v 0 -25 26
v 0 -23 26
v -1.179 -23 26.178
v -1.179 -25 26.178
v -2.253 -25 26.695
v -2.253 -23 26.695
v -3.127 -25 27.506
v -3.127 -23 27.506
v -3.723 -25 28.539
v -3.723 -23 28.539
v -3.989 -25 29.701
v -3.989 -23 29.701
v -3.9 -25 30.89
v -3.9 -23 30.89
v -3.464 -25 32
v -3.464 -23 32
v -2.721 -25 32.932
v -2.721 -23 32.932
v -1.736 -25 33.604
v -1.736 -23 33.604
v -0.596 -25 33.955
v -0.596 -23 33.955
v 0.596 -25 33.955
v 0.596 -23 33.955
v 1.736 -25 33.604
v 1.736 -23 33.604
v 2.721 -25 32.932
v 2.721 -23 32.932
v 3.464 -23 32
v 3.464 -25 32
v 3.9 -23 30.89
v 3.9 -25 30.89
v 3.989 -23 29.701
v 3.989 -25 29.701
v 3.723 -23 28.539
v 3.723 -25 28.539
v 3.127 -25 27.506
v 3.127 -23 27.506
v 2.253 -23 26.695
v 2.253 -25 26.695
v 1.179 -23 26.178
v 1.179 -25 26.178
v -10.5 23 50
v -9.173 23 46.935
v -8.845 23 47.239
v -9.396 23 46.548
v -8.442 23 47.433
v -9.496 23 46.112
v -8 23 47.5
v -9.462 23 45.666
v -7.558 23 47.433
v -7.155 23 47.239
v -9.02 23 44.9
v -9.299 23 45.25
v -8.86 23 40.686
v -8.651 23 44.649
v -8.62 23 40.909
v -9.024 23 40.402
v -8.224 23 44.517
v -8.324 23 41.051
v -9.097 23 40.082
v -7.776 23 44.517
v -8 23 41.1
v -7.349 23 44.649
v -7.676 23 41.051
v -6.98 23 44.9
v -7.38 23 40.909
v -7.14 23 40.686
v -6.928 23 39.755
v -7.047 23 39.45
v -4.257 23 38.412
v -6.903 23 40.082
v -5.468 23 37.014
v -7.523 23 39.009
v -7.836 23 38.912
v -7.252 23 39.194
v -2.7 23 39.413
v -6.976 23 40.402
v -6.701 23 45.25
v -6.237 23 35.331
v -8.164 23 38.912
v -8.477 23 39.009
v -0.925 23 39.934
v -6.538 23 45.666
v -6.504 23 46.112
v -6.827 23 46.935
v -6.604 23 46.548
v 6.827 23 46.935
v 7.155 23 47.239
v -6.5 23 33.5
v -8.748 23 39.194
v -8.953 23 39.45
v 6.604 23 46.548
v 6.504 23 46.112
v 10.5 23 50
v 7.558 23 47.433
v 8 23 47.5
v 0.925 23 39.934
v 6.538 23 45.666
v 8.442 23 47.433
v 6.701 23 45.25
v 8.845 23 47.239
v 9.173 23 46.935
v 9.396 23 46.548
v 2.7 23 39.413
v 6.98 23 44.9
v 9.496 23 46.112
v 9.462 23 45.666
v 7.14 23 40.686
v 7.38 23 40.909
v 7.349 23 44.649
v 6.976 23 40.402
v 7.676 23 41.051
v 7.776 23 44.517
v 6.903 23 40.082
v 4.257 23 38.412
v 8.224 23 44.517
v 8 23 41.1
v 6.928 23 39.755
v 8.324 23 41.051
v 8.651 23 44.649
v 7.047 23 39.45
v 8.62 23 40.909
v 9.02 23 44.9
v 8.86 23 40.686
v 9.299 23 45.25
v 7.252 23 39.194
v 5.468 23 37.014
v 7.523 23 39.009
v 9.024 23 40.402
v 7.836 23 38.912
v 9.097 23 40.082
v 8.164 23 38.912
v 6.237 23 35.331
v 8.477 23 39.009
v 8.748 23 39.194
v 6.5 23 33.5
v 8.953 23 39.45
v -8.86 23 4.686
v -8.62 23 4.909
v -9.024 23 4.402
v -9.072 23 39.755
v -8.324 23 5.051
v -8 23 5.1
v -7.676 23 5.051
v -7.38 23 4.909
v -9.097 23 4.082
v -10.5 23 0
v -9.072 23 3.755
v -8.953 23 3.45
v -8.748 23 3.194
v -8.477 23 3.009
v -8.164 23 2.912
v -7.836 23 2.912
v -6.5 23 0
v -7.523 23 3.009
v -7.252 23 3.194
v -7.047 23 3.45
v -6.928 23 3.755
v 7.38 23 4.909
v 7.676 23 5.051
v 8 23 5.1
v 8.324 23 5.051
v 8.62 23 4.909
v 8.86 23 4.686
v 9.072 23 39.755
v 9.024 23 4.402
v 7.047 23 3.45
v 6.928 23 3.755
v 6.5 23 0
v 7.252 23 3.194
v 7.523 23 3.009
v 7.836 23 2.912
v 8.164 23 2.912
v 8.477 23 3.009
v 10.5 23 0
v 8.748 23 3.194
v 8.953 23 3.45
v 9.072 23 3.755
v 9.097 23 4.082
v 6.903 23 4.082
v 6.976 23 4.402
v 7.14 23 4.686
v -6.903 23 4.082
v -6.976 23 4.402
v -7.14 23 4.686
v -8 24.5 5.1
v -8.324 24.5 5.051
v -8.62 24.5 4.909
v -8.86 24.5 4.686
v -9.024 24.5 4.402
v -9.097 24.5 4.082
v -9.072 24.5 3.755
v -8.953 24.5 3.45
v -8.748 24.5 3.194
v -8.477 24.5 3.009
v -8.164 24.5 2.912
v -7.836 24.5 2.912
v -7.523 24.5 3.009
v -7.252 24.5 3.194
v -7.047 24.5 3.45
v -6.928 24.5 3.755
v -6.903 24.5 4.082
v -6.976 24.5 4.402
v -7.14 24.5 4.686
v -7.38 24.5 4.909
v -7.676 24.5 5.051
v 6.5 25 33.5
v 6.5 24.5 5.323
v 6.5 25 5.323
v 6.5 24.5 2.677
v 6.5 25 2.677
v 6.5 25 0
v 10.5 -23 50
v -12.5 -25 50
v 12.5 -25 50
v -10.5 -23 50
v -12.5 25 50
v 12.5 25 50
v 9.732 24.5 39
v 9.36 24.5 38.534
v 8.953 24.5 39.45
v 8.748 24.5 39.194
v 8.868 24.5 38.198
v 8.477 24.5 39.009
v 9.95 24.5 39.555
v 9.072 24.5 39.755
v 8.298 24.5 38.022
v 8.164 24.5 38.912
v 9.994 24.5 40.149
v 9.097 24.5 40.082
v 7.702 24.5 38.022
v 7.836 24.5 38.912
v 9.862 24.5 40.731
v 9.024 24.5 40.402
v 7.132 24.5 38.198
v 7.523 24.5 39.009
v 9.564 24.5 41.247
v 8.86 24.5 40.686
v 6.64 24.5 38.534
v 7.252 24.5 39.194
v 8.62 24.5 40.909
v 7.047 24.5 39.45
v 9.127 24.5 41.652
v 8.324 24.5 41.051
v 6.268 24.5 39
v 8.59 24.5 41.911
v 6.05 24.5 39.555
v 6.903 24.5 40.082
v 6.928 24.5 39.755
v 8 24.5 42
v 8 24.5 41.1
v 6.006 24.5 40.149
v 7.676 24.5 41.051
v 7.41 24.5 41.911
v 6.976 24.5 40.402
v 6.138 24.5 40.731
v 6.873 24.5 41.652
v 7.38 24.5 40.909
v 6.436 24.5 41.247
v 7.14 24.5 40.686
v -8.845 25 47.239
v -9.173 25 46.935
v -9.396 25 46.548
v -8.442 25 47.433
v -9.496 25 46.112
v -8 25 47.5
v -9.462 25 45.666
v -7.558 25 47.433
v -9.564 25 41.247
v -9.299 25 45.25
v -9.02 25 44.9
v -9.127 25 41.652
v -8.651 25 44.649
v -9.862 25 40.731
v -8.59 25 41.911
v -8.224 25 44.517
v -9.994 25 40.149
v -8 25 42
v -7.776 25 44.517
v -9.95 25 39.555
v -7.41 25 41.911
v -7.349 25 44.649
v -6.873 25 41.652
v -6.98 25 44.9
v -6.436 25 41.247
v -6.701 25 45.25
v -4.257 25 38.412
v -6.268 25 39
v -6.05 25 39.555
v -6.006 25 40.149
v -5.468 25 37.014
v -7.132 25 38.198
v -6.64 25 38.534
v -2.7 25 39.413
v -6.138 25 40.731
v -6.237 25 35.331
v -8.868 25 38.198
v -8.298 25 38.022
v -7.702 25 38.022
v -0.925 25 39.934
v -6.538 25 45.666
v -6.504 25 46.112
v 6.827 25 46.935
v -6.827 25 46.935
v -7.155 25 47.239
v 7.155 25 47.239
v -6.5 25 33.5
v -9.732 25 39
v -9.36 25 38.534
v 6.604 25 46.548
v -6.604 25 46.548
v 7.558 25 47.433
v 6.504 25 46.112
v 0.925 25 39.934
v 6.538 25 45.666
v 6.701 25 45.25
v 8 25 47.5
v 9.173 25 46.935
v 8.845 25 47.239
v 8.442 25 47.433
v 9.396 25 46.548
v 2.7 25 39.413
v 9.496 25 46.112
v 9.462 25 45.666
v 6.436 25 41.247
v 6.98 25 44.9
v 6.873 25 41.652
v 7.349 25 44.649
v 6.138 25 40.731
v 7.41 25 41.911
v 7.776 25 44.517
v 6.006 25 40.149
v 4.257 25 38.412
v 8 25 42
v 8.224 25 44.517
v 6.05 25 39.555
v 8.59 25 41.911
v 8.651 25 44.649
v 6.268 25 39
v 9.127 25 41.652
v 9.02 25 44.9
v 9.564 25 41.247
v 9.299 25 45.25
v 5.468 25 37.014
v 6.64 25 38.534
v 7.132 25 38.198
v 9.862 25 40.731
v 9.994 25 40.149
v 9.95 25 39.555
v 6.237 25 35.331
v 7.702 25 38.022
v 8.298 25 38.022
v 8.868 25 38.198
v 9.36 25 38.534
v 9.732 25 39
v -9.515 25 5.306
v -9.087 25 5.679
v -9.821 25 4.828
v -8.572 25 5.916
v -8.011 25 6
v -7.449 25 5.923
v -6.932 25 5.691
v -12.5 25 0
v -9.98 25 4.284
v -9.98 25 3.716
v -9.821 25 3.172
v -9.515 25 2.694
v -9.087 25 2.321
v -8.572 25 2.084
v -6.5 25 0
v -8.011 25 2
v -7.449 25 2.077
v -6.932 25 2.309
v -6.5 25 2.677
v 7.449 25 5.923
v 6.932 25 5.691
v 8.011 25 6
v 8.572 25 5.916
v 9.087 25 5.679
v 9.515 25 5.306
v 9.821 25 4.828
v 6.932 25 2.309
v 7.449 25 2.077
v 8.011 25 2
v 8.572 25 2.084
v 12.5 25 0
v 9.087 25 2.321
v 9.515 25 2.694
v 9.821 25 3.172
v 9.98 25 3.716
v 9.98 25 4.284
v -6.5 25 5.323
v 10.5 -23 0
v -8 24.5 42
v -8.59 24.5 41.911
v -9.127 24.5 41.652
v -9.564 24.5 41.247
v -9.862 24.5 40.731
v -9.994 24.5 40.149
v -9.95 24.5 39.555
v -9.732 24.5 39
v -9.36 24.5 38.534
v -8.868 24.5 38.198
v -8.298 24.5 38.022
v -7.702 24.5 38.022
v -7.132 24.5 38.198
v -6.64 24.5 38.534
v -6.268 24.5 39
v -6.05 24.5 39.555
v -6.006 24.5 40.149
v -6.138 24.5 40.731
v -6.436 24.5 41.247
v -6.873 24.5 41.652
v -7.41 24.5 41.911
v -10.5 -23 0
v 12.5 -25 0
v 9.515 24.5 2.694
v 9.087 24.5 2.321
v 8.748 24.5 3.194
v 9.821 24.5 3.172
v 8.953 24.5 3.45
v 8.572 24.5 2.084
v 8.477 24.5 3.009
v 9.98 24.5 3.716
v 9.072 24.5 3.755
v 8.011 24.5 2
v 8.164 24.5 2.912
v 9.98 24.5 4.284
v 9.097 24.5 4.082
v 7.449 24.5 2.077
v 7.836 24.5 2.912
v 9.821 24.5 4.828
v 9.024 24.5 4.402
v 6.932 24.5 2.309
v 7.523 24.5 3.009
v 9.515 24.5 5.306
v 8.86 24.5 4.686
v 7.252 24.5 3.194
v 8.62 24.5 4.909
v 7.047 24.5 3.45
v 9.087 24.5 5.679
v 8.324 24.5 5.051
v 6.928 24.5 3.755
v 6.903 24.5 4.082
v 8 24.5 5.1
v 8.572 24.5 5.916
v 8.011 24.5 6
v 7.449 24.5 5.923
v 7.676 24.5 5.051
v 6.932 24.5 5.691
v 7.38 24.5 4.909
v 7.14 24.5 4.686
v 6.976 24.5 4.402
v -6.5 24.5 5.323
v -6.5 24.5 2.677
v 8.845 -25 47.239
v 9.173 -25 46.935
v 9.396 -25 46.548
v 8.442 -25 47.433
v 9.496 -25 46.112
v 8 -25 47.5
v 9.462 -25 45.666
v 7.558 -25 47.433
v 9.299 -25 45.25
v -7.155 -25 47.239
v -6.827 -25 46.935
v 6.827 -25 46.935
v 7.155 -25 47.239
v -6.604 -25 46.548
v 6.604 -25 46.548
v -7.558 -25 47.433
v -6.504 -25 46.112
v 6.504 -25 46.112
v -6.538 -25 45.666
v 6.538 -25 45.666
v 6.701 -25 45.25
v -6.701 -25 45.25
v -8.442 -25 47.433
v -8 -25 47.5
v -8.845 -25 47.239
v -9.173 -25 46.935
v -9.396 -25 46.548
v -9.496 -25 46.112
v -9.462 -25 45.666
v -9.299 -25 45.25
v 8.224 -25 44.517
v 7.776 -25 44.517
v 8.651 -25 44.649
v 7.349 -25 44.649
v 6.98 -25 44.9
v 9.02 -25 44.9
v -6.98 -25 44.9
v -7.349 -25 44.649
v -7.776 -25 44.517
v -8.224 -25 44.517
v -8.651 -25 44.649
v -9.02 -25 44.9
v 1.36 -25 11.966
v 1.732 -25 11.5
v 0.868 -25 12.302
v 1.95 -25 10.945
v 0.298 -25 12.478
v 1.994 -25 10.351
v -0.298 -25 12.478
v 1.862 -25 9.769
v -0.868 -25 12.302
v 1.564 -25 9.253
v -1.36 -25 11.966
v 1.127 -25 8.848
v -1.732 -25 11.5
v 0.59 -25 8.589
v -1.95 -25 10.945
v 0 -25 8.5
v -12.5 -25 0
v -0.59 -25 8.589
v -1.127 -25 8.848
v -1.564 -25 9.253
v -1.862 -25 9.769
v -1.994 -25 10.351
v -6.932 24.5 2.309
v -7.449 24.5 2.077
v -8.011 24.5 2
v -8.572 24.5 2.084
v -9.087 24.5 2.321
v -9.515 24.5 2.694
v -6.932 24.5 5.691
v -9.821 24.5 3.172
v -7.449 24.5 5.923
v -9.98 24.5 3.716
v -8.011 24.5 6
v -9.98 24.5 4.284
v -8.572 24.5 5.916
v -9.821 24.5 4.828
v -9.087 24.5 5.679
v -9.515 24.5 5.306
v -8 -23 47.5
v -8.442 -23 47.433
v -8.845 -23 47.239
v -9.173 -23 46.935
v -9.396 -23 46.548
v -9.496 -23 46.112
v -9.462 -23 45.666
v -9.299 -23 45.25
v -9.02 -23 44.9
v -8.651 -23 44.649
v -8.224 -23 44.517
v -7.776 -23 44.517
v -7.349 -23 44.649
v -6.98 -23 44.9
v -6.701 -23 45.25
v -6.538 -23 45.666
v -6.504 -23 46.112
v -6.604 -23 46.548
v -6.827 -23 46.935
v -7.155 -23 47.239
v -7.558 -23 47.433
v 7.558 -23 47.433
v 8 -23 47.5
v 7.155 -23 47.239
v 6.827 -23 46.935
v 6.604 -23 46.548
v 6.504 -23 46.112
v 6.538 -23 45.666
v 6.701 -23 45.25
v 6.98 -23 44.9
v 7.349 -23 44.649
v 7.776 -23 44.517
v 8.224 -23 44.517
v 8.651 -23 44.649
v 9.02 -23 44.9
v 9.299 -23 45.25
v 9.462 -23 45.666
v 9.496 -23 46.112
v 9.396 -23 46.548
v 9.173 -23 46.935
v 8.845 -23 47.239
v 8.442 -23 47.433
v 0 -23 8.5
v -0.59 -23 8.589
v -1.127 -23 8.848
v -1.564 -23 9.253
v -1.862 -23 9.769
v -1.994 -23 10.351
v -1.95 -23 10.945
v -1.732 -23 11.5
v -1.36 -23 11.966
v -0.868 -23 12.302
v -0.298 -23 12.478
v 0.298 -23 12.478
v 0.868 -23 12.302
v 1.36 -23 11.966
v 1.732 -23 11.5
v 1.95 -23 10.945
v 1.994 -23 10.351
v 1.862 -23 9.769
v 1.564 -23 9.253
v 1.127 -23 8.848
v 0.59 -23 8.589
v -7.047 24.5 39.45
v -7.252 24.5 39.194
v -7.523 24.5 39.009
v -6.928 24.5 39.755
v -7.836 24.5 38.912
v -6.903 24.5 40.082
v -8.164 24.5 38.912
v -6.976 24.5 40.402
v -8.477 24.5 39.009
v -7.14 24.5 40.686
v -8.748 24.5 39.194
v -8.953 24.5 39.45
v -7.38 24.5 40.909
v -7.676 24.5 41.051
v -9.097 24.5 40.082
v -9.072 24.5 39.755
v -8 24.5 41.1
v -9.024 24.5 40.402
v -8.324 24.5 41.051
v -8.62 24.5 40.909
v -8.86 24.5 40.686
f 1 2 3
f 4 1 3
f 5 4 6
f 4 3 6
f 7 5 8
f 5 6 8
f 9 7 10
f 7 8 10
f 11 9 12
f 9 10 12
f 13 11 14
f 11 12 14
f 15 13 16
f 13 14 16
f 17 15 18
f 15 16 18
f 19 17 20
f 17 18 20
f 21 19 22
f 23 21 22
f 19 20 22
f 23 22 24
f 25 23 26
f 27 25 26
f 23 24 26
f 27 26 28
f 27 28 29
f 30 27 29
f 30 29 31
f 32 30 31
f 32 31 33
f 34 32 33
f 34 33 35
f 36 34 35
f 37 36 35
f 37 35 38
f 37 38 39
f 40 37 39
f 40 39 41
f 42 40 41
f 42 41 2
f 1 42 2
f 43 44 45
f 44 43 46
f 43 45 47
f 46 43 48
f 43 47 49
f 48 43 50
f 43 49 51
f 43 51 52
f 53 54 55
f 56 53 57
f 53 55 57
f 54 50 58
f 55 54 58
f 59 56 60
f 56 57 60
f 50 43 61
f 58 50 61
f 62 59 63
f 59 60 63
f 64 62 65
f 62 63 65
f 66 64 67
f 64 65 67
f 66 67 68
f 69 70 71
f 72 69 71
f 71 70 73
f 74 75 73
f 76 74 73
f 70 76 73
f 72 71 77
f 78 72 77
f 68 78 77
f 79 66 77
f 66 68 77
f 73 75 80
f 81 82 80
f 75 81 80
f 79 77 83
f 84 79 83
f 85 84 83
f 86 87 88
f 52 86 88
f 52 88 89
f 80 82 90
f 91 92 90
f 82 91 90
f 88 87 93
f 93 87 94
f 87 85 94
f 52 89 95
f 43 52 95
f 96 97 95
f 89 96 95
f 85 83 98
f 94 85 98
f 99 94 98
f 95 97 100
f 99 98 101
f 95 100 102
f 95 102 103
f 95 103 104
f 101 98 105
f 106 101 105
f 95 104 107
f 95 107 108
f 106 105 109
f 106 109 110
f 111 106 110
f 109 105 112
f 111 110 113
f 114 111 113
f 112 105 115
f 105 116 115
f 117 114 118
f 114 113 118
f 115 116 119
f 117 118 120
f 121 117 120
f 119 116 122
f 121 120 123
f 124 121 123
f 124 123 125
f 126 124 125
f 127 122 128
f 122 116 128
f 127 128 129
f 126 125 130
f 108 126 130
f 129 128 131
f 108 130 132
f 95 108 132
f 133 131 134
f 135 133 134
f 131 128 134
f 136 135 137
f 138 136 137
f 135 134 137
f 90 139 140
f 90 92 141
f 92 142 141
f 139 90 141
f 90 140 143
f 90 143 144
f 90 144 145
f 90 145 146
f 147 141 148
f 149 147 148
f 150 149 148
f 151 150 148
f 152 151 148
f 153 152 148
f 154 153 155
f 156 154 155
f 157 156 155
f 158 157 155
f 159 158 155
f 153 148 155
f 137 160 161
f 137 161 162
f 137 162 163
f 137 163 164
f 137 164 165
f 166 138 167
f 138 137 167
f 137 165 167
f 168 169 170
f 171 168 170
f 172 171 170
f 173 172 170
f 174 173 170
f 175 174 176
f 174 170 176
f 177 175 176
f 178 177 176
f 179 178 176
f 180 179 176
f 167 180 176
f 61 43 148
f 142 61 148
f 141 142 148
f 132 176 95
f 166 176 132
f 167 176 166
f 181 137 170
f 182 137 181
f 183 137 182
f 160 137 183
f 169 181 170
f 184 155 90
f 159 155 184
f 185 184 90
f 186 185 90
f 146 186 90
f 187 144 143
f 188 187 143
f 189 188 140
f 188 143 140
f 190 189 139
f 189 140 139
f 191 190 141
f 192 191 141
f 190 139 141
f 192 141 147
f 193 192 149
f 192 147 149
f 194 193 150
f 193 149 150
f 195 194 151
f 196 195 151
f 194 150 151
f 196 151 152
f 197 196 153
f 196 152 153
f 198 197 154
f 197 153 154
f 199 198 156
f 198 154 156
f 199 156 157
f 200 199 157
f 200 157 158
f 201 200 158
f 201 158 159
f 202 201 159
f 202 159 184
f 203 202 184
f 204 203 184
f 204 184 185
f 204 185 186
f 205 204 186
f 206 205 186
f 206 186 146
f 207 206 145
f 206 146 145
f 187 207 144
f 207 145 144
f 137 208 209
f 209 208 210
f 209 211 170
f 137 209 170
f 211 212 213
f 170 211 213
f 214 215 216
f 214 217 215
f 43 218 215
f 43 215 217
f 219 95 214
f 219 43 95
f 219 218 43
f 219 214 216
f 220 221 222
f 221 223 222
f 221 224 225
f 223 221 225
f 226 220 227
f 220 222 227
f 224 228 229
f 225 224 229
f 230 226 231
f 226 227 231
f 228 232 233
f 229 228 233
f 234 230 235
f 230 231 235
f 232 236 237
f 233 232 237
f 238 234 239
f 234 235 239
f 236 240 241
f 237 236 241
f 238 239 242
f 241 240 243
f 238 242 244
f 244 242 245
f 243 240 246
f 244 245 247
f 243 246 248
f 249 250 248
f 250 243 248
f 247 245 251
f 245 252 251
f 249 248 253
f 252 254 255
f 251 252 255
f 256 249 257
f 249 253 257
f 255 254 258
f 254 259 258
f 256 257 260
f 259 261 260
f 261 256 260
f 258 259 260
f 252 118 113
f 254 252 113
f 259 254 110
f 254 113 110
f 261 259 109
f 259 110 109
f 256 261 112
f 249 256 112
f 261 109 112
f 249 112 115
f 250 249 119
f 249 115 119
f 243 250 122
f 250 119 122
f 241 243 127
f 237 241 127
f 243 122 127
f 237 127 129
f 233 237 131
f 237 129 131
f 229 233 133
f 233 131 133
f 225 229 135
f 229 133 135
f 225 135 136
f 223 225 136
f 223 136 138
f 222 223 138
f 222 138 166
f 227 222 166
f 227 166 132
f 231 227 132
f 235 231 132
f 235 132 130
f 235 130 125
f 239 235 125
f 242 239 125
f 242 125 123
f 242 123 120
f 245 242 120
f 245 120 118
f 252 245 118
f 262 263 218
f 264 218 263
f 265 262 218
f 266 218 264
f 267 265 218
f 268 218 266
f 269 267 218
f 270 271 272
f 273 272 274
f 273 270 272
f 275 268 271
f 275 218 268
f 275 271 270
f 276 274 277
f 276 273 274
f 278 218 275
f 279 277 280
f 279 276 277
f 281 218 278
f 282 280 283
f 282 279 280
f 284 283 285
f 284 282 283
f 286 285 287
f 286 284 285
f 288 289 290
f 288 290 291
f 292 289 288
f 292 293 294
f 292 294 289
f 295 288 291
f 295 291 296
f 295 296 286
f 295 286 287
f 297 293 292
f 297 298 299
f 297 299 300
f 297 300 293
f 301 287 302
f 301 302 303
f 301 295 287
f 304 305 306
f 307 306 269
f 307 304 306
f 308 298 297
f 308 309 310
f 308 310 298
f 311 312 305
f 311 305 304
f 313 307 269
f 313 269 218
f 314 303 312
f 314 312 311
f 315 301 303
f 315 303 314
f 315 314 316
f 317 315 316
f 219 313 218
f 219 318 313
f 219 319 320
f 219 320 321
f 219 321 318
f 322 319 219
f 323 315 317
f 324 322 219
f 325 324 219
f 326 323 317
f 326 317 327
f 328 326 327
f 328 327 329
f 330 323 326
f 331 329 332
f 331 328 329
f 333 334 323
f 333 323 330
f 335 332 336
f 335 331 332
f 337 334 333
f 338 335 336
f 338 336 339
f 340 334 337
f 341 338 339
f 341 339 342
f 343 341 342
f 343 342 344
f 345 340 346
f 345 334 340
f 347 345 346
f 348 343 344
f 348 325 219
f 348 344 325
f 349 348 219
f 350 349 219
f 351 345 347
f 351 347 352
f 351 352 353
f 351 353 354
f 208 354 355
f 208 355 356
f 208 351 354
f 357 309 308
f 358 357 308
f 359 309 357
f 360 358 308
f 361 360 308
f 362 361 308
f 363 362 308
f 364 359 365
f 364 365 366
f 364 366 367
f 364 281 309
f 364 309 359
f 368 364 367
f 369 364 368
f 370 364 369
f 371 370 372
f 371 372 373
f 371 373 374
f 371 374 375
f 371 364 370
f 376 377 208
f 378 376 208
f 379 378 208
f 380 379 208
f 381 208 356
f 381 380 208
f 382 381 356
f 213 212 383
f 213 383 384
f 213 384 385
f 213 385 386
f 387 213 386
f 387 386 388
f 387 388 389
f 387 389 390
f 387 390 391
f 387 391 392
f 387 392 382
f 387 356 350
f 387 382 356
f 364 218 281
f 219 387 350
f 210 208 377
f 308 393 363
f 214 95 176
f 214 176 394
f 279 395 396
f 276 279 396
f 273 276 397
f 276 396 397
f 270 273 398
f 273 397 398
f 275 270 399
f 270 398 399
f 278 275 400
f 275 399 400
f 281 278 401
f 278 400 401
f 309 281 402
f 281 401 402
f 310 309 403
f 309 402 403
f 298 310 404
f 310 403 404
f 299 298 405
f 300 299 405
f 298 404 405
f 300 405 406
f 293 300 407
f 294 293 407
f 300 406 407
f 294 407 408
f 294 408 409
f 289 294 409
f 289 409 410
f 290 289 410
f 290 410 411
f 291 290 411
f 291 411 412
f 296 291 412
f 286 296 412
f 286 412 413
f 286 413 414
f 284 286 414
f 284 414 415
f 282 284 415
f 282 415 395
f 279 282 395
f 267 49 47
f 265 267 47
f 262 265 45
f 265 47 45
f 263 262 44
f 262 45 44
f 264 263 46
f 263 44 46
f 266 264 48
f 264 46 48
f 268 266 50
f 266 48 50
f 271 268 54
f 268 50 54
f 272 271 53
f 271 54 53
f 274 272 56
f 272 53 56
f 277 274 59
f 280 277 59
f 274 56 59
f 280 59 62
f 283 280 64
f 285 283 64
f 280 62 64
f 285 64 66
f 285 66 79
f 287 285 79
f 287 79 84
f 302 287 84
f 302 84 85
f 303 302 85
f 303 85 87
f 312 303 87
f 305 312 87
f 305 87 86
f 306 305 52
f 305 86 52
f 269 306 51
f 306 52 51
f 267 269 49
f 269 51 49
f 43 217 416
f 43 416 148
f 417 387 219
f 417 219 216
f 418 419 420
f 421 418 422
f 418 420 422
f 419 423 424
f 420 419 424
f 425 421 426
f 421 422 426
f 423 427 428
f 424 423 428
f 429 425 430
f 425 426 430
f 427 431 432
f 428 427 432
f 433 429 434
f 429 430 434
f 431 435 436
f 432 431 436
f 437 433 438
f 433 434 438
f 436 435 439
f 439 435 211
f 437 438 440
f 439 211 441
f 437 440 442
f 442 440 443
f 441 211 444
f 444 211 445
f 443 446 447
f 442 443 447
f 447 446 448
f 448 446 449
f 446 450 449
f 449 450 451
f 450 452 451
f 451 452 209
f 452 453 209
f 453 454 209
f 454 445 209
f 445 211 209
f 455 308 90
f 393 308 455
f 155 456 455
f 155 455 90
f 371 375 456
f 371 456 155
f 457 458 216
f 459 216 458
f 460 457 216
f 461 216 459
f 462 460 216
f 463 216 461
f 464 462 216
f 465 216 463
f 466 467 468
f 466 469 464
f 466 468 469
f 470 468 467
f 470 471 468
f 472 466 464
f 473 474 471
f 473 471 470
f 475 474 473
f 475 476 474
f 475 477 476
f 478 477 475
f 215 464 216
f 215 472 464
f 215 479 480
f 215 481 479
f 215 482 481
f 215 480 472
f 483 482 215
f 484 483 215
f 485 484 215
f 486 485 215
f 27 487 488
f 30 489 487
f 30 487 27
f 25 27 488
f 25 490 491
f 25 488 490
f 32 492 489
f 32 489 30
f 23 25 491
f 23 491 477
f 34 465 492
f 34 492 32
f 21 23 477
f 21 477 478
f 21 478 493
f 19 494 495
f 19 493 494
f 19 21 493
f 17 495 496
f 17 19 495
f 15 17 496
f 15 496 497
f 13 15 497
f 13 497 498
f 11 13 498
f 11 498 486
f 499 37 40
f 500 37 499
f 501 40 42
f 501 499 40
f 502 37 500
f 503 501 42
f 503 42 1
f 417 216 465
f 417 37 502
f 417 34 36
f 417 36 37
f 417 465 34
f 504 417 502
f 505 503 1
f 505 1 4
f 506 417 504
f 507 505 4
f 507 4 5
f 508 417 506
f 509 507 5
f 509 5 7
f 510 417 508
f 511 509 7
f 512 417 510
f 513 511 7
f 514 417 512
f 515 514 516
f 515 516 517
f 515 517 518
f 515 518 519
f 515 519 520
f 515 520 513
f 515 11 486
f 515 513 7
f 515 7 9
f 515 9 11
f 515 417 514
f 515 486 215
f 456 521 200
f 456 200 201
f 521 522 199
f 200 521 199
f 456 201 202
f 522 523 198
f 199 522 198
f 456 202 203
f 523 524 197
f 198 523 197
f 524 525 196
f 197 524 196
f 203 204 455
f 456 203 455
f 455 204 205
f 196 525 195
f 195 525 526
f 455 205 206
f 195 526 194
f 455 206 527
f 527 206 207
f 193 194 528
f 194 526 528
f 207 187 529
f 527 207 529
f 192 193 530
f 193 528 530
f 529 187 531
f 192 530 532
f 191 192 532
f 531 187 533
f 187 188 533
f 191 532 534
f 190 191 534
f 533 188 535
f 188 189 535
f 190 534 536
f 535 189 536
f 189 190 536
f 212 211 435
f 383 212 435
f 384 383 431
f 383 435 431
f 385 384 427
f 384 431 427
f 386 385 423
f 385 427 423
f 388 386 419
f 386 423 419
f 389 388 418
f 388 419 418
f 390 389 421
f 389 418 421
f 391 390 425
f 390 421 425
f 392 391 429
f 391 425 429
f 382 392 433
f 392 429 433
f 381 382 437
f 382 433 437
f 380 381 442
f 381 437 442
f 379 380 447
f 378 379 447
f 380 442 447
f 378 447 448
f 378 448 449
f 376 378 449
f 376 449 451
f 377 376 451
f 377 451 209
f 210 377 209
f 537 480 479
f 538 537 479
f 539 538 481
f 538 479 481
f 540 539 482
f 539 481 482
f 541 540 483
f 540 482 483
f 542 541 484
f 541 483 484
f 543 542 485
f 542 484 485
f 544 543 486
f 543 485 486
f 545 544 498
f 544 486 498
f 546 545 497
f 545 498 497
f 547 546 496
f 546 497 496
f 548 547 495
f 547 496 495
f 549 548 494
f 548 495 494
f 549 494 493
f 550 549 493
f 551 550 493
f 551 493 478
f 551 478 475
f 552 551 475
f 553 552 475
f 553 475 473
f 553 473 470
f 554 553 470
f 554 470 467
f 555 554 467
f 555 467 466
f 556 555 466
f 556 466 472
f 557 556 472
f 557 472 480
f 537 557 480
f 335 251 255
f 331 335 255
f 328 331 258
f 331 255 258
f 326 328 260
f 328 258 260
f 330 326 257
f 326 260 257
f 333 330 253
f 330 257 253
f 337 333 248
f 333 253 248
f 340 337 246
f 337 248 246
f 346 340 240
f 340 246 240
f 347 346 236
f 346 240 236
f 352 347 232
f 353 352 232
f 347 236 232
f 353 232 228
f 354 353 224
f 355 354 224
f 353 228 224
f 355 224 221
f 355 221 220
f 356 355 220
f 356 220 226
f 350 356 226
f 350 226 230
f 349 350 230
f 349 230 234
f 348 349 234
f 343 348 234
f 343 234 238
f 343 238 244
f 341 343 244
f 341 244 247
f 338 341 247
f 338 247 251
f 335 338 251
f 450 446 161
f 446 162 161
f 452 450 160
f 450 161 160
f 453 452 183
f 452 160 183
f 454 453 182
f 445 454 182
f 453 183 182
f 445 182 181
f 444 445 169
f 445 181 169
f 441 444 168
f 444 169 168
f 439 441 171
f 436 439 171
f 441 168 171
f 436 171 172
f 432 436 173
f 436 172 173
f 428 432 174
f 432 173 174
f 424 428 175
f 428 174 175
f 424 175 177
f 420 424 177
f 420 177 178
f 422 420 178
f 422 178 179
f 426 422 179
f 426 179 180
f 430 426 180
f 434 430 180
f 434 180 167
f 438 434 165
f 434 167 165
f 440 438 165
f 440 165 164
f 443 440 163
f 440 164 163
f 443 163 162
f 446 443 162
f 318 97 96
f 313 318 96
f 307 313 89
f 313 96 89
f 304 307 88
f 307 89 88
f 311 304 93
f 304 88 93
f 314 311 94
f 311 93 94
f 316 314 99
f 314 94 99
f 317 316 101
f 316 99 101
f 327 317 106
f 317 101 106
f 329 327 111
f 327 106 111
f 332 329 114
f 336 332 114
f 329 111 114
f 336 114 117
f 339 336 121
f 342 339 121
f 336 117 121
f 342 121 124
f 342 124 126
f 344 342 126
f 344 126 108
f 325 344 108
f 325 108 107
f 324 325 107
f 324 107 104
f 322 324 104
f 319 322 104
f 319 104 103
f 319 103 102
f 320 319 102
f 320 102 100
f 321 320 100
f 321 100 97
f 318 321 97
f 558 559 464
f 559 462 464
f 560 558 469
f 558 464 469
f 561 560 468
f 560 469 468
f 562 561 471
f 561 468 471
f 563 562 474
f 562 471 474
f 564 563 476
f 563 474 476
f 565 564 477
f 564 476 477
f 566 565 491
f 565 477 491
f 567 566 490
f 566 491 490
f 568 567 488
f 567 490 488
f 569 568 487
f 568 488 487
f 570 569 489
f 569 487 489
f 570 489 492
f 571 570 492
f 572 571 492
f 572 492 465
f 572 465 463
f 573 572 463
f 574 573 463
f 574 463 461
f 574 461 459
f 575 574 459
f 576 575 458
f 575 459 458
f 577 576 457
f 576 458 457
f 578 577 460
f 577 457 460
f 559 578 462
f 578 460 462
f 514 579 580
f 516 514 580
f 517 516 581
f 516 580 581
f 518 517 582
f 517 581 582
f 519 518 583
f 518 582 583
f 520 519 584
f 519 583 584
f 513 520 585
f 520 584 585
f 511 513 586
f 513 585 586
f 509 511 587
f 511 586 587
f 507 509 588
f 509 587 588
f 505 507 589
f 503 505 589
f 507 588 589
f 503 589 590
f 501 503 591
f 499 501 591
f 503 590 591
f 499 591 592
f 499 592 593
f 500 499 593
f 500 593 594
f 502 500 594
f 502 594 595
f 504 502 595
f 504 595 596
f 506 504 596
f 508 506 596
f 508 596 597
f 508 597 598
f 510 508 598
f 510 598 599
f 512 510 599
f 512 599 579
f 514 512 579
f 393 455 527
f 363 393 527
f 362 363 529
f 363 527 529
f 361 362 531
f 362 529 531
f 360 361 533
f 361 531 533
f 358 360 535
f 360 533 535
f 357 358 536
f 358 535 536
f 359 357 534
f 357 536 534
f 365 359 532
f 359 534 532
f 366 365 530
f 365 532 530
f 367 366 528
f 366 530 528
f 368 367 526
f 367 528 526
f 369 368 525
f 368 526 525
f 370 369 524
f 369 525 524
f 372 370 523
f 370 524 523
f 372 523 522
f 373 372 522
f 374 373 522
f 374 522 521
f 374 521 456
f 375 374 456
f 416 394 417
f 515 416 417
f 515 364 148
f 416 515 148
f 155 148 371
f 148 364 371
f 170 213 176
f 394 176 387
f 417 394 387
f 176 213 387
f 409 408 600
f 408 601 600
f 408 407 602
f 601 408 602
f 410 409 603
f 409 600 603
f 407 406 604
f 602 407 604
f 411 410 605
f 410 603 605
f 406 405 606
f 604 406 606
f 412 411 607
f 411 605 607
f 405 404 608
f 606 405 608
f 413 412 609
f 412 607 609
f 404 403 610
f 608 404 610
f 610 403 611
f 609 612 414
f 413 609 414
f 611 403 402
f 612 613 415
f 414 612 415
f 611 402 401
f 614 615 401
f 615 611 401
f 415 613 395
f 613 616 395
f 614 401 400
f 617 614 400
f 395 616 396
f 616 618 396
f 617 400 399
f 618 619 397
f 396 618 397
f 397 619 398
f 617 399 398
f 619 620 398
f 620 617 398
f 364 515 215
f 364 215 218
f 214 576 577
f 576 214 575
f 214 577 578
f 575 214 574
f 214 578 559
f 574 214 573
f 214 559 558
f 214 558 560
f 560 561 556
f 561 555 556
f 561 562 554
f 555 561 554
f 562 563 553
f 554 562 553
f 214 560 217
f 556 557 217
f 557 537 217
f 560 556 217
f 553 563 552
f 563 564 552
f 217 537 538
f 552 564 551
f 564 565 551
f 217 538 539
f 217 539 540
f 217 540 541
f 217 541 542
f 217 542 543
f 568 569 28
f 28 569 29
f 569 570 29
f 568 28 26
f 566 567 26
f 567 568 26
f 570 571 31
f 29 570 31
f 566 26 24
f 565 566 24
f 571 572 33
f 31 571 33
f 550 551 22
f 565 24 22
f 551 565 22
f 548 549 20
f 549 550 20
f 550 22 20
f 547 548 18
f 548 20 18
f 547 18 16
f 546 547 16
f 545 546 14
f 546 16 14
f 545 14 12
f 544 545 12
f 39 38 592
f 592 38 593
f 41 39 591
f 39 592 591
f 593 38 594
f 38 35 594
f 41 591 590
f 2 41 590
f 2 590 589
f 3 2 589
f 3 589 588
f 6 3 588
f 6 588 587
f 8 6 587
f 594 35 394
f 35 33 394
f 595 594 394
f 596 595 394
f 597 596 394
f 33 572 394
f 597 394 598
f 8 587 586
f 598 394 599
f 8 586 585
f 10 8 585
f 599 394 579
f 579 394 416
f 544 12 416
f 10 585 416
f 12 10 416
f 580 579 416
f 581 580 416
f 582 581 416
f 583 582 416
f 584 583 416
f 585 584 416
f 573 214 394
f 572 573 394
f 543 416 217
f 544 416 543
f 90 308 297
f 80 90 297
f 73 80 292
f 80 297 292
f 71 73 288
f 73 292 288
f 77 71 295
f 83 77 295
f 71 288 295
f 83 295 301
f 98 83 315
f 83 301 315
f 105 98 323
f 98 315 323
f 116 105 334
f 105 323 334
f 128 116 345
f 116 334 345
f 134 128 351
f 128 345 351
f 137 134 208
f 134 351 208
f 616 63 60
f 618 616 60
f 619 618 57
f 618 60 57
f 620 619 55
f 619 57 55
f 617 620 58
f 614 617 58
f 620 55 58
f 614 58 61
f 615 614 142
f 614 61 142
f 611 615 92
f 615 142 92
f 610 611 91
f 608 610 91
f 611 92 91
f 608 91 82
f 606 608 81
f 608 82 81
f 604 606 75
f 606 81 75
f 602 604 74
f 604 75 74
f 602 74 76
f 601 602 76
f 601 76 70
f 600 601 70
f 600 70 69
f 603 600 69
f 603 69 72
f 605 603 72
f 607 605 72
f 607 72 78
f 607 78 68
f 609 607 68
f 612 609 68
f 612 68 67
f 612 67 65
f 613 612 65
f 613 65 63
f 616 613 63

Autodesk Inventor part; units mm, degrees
ref_plane "YZ Plane" through (0, 0, 0) normal (1, 0, 0) x (0, 1, 0)
ref_plane "XZ Plane" through (0, 0, 0) normal (0, 1, 0) x (-1, 0, 0)
ref_plane "XY Plane" through (0, 0, 0) normal (0, 0, 1) x (1, 0, 0)
sketch "スケッチ1" plane through (0, 0, 0) normal (0, 0, 1) x (1, 0, 0)
  line L0 (-12.5, 25) -> (12.5, 25)
  line L1 (12.5, 25) -> (12.5, -25)
  line L2 (12.5, -25) -> (-12.5, -25)
  line L3 (-12.5, -25) -> (-12.5, 25)
  line L4 (-10.5, 23) -> (10.5, 23)
  line L5 (10.5, 23) -> (10.5, -23)
  line L6 (10.5, -23) -> (-10.5, -23)
  line L7 (-10.5, -23) -> (-10.5, 23)
  point P0 (0, 0)
  dimension "d0" = 25
  dimension "d1" = 50
  dimension "d2" = 46
  dimension "d3" = 21
  dimension "d4" = 25
  dimension "d5" = 23
  dimension "d6" = 10.5
  dimension "d7" = 12.5
extrude "押し出し1" add sketch "スケッチ1" along normal blind 50
sketch "スケッチ2" plane through (-12.5, 25, 0) normal (0, 1, 0) x (1, 0, 0)
  line L0 (0, 0) -> (25, 0) projected
  line L1 (0, 0) -> (0, -50) projected
  arc A0 (6, -33.5) -> (19, -33.5) centre (12.5, -33.5) ccw
  line L2 (6, -33.5) -> (6, 0)
  line L3 (19, -33.5) -> (19, 0)
  point P0 (12.5, 0)
  dimension "d10" = 13
  dimension "d11" = 33.5
  dimension "d12" = 12.5
extrude "押し出し2" cut sketch "スケッチ2" against normal blind 2
sketch "スケッチ3" plane through (-12.5, 25, 50) normal (0, 1, 0) x (1, 0, 0)
  arc A0 (6, 16.5) -> (19, 16.5) centre (12.5, 16.5) ccw projected
  circle A1 centre (4.5, 10) radius 1.1
  circle A2 centre (4.5, 46) radius 1.1
  circle A3 centre (20.5, 46) radius 1.1
  circle A4 centre (20.5, 10) radius 1.1
  point P0 (12.5, 50)
  dimension "d15" = 6.5
  dimension "d16" = 6.5
  dimension "d17" = 2.2
  dimension "d18" = 8
  dimension "d19" = 8
  dimension "d20" = 8
  dimension "d21" = 8
  dimension "d22" = 29.5
  dimension "d23" = 29.5
hole "穴1" at (-8, 25, 4) at (8, 25, 4) at (8, 25, 40) at (-8, 25, 40) direction (0, -1, 0) diameter 2.2 depth 2 tip angle 118 counterbore diameter 4 counterbore depth 0.5
sketch "スケッチ4" plane through (-12.5, -25, 0) normal (0, -1, 0) x (1, 0, 0)
  line L0 (25, 0) -> (0, 0) projected
  line L1 (25, 0) -> (25, 50) projected
  circle A0 centre (12.5, 10.5) radius 2
  point P0 (12.5, 0)
  dimension "d31" = 4
  dimension "d32" = 12.5
  dimension "d33" = 10.5
hole "穴2" at (0, -25, 10.5) direction (0, 1, 0) diameter 4 end through all
sketch "スケッチ5" plane through (-12.5, 25, 50) normal (0, 1, 0) x (1, 0, 0)
  line L0 (0, 0) -> (25, 0) projected
  arc A0 (6, 16.5) -> (19, 16.5) centre (12.5, 16.5) ccw projected
  circle A1 centre (20.5, 4) radius 1.5
  circle A2 centre (4.5, 4) radius 1.5
  point P0 (12.5, 50)
  dimension "d43" = 4
  dimension "d44" = 4
  dimension "d46" = 8
  dimension "d47" = 8
  dimension "d57" = 3
hole "穴4" at (-8, 25, 46) at (8, 25, 46) direction (0, -1, 0) diameter 3 end through all
thread "ねじ1" size "M3x0.5" class "6H" standard "ANSI Metric M Profile" full length
thread "ねじ2" size "M3x0.5" class "6H" standard "ANSI Metric M Profile" full length
thread "ねじ3" size "M3x0.5" class "6H" standard "ANSI Metric M Profile" full length
thread "ねじ4" size "M3x0.5" class "6H" standard "ANSI Metric M Profile" full length
sketch "スケッチ7" plane through (-12.5, -25, 0) normal (0, -1, 0) x (1, 0, 0)
  line L0 (25, 50) -> (0, 50) projected
  line L1 (0, 0) -> (0, 50) projected
  circle A0 centre (12.5, 30) radius 4
  point P0 (12.5, 0)
  dimension "d78" = 8
  dimension "d80" = 20
  dimension "d81" = 12.5
hole "穴5" at (0, -25, 30) direction (0, 1, 0) diameter 8 end through all
properties part number "08" material "アルミニウム 6061"
